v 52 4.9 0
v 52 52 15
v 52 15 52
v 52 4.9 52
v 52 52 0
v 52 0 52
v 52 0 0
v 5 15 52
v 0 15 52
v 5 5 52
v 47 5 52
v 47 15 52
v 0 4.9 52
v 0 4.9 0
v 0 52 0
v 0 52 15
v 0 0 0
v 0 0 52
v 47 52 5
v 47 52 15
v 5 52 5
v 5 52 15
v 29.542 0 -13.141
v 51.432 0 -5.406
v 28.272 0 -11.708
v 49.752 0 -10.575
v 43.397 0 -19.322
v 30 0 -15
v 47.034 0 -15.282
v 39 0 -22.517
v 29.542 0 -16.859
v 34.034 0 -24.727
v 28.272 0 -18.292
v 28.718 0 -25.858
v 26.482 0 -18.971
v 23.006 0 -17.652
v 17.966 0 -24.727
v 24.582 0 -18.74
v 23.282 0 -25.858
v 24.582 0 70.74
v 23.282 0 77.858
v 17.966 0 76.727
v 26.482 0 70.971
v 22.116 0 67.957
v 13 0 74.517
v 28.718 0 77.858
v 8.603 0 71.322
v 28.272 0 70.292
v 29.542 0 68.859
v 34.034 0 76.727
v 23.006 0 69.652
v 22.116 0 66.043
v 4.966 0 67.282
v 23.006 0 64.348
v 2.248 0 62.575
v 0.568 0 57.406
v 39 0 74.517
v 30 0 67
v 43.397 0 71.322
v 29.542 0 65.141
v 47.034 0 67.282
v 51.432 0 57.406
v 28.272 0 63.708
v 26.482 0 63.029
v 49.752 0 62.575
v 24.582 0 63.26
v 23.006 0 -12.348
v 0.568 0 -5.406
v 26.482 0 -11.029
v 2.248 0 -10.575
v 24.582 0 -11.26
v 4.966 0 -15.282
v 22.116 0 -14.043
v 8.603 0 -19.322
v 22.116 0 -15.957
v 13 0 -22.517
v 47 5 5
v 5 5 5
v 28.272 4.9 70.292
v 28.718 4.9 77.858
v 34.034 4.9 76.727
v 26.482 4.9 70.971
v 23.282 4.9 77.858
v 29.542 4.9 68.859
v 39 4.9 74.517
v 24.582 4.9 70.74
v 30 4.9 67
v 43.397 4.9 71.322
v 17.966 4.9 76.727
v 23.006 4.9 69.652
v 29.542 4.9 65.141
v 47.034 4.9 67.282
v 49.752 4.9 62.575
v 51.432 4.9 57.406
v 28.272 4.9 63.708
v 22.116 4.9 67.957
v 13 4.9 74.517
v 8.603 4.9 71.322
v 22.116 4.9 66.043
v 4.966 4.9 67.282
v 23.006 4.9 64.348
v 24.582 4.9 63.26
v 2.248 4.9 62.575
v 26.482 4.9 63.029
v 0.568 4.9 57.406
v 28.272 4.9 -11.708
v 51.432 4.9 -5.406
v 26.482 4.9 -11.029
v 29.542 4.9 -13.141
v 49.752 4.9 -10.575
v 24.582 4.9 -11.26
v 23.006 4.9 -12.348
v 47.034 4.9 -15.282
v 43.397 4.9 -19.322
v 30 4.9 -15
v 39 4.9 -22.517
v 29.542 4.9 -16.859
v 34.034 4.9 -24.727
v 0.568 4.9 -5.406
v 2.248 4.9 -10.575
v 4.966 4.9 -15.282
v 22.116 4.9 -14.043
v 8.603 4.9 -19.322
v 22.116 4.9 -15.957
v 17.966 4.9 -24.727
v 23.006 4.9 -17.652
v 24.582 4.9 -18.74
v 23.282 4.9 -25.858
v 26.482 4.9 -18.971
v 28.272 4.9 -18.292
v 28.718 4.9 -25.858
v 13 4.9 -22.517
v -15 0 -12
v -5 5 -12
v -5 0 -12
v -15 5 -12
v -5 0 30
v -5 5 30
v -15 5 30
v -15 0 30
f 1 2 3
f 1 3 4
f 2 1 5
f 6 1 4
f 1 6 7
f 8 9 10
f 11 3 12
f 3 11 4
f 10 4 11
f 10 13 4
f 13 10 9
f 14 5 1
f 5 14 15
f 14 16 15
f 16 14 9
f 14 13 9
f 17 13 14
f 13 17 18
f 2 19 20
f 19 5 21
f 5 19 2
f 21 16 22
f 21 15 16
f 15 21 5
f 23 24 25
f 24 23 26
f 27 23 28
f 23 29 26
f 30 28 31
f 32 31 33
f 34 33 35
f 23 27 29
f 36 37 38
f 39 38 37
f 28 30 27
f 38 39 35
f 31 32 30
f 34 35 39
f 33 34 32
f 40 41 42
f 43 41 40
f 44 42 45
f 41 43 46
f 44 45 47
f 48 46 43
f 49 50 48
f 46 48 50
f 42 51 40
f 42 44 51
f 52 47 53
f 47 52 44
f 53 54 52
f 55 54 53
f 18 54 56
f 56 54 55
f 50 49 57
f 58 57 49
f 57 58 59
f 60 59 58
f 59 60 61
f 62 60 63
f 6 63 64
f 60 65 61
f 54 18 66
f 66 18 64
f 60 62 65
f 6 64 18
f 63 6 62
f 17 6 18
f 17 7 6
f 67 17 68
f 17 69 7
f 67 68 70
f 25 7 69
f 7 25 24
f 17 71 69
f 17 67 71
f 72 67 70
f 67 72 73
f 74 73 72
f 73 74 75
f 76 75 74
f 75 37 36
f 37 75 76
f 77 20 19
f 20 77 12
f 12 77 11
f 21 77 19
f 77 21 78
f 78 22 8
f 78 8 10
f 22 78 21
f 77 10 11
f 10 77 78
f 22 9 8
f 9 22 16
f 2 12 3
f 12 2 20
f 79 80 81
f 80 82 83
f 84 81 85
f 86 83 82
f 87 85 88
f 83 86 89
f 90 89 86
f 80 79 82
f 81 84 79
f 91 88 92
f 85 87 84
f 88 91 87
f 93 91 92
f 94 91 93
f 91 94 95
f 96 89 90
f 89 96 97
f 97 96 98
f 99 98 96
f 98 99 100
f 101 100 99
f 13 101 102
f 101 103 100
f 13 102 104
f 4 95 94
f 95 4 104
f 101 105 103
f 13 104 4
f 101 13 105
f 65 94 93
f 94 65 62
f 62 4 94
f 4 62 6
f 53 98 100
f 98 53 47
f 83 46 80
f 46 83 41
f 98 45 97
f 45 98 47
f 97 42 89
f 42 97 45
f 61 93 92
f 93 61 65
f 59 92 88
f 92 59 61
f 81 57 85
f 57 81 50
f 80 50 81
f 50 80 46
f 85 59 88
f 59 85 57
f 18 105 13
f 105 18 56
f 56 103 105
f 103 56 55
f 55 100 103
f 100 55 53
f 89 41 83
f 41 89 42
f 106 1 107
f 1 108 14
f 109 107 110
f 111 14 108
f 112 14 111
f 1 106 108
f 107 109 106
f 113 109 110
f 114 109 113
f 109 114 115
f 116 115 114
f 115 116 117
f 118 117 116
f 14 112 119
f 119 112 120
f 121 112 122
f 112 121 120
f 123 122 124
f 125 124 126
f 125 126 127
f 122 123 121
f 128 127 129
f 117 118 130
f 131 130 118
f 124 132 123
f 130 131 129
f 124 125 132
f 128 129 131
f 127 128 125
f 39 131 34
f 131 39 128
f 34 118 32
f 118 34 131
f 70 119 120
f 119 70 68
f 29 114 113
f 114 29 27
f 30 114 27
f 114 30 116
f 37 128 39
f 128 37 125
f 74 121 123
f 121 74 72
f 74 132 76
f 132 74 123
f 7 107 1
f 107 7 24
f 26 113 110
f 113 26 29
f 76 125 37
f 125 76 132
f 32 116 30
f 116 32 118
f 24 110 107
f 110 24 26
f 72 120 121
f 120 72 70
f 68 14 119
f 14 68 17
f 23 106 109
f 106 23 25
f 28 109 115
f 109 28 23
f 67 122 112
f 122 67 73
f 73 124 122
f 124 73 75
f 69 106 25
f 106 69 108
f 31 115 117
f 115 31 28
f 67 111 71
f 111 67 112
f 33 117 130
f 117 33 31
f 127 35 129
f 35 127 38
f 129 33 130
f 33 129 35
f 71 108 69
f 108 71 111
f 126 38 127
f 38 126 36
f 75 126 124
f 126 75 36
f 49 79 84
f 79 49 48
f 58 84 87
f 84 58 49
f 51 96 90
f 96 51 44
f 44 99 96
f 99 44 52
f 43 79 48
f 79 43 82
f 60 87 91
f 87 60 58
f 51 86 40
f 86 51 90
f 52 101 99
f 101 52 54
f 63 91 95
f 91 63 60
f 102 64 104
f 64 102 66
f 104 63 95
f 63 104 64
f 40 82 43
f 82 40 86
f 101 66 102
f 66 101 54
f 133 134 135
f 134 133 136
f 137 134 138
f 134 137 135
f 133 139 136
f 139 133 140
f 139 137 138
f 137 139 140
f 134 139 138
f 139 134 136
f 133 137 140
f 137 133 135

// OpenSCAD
cube_size = 52;

innerSize = 42; 

difference(){
union(){
difference(){

    union(){difference(){
    {difference(){
       
        {difference(){
        cube([cube_size, cube_size, cube_size], center = [0,0,0]);
            
        translate([5, 5, 5]) cube([innerSize, innerSize, innerSize + 5], center = [50,10,20]);
        }}
        
        translate([5, 20, 15]) cube([innerSize, innerSize, innerSize + 5], center = [50,10,20]);
    } 

    color("red") translate([-2, cube_size, 15]) rotate([45, 0,0,])  cube([cube_size+4, cube_size+5, cube_size*2], center = false);
    }
    }


    


    //rotate([90, 0,0])  translate([0,cube_size,-5]) cube([52, 30, 5]);
    rotate([90, 0,0])  translate([cube_size/2,cube_size,-4.9]) cylinder(4.9, 52/2, 52/2);
    rotate([90, 0,0])  translate([cube_size/2,0,-4.9]) cylinder(4.9, 52/2, 52/2);
    }



{rotate([90, 0,0])  translate([cube_size / 2,-15,-10]) cylinder(20, 4,4);}
{rotate([90, 0,0])  translate([cube_size / 2,cube_size + 15,-10]) cylinder(20, 4,4);}
}}

color("gray") translate([5, 15, 5]) cube([innerSize, innerSize, innerSize], center = [50,10,20]);
}

color("gray") rotate([0,90,0]) translate([-30, 0, -15]) cube([innerSize, 5, 10], center = false);
